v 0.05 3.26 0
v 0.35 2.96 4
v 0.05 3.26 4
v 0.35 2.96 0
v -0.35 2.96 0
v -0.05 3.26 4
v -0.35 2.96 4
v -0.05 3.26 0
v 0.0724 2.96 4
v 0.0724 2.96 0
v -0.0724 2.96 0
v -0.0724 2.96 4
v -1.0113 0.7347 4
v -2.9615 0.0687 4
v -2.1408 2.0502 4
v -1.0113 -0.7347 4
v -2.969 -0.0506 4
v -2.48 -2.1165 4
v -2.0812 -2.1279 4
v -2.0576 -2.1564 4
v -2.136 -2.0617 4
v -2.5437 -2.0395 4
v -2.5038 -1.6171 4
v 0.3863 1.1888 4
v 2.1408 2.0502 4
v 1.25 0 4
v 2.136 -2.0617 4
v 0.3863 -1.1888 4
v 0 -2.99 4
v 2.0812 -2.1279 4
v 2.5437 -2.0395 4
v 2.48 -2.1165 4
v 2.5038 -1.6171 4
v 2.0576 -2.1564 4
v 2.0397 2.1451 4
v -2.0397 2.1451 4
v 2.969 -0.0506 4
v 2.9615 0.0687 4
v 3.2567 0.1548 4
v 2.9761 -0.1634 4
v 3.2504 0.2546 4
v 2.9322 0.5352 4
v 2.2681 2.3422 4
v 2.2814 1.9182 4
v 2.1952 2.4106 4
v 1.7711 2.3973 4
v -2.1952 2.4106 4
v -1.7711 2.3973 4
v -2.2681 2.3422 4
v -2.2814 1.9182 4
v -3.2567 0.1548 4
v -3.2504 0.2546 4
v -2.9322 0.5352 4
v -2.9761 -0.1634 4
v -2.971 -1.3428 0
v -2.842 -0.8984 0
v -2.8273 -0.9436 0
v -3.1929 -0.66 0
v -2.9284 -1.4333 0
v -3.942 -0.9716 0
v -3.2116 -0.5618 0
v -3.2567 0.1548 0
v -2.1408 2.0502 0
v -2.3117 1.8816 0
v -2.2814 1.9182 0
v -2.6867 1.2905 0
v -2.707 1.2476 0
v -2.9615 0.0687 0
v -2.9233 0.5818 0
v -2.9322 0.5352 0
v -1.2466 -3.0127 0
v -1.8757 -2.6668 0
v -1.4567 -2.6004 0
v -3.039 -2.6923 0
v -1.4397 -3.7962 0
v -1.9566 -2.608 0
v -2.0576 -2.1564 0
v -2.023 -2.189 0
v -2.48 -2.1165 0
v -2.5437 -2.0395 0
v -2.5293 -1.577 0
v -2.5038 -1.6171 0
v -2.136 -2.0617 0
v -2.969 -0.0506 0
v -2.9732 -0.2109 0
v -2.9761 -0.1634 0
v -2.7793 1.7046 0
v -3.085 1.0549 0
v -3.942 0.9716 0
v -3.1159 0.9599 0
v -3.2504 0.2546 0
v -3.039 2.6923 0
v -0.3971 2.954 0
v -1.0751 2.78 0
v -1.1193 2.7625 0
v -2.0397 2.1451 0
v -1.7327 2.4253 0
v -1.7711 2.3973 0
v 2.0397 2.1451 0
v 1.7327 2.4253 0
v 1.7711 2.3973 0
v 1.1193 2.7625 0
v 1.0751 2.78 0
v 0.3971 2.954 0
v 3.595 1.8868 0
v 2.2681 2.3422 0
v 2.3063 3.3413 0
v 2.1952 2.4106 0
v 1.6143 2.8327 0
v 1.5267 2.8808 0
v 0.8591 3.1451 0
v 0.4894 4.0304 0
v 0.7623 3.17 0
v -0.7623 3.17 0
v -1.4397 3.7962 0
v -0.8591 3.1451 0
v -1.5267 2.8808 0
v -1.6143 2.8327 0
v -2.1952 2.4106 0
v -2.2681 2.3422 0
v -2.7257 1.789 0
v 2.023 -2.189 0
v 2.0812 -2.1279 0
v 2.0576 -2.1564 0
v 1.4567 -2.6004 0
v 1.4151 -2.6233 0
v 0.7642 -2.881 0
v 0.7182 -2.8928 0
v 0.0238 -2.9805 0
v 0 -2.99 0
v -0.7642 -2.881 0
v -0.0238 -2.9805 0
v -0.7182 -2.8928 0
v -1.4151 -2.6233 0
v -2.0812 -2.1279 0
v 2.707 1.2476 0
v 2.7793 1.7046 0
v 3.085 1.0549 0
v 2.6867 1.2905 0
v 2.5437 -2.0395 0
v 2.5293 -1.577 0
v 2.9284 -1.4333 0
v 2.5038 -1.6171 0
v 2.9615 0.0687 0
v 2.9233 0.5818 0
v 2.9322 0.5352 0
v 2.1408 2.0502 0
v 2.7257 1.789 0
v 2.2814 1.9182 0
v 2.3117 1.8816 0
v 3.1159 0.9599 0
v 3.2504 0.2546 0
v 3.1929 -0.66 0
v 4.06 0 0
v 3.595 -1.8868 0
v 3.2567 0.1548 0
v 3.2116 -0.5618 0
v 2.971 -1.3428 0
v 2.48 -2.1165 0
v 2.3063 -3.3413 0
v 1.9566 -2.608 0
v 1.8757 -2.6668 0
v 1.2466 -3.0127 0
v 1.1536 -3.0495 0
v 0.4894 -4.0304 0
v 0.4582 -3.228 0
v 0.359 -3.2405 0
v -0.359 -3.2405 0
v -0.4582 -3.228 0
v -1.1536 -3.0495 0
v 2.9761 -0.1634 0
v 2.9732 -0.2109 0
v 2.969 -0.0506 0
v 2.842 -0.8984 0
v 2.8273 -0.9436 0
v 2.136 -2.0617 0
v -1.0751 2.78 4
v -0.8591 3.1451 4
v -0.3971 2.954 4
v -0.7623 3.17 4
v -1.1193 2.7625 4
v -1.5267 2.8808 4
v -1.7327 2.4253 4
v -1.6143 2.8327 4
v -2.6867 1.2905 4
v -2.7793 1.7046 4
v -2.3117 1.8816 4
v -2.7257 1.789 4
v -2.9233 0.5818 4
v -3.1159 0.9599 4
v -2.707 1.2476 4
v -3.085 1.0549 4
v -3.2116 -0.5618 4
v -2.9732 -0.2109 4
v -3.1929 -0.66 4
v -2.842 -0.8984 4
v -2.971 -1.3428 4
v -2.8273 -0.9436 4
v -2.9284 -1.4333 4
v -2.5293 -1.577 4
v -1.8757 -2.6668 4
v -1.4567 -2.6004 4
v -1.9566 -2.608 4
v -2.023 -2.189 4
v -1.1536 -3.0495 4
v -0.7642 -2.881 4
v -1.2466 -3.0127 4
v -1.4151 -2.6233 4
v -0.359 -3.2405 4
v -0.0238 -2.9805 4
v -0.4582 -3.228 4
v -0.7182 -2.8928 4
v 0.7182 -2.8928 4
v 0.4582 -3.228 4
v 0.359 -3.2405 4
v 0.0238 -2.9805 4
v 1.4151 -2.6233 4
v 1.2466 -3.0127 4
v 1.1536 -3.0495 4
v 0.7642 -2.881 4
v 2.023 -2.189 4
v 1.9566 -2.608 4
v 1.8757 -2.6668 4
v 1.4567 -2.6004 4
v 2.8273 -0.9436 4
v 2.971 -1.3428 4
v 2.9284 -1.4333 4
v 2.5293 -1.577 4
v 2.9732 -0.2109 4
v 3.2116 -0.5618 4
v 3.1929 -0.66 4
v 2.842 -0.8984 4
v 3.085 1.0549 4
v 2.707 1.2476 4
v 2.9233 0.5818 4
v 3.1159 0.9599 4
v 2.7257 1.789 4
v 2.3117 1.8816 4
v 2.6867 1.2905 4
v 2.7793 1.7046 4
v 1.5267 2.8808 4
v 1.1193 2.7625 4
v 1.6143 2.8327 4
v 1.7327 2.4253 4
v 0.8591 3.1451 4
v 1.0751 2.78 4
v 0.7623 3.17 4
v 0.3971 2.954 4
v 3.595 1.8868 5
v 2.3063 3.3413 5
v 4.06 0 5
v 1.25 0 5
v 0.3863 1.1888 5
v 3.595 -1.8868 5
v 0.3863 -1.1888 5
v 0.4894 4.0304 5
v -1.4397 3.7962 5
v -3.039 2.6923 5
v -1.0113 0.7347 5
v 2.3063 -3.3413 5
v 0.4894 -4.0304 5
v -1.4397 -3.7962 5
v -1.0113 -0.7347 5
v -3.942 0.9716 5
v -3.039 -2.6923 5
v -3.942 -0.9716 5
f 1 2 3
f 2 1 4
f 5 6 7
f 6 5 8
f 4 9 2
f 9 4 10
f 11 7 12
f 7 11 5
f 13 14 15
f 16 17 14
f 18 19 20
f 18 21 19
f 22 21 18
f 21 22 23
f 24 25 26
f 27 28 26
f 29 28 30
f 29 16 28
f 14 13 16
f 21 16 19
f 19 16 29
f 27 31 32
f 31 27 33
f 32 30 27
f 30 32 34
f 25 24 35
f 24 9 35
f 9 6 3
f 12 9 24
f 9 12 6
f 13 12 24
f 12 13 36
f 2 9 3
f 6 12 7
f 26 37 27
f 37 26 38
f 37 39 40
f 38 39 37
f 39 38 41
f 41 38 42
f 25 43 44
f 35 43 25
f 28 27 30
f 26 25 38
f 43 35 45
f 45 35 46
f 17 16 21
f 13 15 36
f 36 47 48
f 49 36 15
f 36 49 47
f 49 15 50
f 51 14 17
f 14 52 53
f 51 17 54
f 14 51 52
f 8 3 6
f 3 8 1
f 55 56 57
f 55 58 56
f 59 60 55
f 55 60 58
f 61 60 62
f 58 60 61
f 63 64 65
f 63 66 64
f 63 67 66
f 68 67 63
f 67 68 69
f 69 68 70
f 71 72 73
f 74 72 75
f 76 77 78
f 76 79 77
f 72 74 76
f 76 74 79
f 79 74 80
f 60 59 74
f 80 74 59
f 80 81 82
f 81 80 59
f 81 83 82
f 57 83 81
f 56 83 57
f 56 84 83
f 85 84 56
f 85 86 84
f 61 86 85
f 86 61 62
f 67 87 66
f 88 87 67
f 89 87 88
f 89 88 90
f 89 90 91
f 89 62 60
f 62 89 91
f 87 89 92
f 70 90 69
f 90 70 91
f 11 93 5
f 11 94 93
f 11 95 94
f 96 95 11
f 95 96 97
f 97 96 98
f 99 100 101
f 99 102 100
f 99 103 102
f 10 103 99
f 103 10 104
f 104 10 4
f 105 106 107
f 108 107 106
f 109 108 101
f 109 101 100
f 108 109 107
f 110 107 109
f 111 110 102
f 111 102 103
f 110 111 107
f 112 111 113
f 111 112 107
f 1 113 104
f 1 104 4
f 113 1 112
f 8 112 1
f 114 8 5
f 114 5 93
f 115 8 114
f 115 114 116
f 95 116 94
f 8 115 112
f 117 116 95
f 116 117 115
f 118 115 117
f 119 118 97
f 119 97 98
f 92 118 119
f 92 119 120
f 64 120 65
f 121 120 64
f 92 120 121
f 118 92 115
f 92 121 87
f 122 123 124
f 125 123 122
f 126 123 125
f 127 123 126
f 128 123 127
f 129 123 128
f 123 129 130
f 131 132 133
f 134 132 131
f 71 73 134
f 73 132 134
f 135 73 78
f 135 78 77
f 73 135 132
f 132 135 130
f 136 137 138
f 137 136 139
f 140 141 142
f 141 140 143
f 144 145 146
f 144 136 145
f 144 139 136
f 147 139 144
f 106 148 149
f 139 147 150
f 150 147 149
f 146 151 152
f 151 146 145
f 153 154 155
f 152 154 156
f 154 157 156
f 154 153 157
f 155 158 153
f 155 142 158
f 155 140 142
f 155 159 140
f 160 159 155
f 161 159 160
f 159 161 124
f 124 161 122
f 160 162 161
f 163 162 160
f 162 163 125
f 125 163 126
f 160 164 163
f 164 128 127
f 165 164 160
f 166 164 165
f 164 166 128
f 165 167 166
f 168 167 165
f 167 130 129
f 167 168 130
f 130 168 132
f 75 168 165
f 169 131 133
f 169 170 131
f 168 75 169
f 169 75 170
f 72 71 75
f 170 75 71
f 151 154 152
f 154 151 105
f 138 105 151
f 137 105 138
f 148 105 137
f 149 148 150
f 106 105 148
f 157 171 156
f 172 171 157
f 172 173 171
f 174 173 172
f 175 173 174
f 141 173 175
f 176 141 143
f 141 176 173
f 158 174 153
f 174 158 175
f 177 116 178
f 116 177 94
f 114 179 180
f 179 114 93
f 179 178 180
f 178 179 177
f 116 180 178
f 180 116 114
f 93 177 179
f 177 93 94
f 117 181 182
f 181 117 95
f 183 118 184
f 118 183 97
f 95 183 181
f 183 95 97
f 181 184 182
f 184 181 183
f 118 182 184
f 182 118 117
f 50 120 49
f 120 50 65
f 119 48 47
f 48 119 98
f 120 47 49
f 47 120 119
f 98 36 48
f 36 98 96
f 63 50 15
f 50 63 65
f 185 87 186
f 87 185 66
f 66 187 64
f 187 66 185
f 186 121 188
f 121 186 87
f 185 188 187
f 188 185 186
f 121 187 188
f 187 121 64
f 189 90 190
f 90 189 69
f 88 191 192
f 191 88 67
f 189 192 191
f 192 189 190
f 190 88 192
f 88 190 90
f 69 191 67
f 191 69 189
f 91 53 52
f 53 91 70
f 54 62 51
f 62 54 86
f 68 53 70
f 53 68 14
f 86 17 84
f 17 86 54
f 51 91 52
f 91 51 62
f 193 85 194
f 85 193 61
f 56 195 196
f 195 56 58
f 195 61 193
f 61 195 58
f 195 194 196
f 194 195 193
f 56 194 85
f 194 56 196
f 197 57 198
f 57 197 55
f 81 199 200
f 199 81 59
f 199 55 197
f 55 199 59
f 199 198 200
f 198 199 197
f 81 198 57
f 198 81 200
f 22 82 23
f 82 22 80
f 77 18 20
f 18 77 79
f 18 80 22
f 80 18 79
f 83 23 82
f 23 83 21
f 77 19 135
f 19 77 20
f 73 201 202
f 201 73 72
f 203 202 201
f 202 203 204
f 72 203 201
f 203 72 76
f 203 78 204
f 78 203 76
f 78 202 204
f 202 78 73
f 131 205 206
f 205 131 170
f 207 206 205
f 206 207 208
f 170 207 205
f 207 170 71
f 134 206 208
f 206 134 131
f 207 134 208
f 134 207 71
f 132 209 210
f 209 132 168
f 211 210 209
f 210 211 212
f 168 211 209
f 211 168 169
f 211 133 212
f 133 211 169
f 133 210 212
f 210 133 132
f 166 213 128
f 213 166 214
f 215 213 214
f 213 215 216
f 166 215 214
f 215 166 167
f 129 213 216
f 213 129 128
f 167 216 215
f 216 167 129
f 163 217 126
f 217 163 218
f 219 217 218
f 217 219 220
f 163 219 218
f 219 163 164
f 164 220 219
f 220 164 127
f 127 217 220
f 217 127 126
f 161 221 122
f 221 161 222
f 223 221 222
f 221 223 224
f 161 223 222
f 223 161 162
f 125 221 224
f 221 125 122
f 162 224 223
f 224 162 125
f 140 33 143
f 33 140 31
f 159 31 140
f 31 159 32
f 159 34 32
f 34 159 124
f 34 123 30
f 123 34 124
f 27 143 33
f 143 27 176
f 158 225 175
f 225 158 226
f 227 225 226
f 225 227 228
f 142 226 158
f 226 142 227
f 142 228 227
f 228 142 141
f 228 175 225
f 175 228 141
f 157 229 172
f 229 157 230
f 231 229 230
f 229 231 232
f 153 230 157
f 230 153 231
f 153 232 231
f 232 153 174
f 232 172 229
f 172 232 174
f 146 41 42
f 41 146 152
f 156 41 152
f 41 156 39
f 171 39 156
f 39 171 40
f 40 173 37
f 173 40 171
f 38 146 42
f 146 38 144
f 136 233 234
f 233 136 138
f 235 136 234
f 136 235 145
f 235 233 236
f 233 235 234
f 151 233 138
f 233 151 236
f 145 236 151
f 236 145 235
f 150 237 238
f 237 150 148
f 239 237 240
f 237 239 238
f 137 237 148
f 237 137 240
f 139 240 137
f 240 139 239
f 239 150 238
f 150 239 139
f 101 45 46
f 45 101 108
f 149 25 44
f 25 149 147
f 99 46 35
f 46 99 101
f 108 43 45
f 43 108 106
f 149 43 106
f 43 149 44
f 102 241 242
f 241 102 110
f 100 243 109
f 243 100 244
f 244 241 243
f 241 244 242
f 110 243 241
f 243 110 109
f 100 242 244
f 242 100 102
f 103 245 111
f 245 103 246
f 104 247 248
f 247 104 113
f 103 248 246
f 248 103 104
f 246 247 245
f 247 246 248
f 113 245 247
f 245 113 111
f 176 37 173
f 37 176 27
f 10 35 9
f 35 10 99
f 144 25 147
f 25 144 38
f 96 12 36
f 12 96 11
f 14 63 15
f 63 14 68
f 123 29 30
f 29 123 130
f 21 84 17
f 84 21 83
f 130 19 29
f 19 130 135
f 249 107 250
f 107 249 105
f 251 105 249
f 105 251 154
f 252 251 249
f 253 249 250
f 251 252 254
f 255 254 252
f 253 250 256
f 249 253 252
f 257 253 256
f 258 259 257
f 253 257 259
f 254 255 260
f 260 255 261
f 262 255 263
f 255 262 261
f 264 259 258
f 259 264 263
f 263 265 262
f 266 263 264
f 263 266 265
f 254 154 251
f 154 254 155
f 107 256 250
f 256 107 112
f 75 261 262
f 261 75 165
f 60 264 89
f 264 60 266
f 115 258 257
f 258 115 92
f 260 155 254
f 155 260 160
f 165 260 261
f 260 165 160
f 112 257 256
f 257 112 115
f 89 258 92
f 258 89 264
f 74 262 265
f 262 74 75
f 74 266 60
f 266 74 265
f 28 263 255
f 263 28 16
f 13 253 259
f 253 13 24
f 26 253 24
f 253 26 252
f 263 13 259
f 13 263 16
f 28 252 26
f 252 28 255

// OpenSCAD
toothLength = 0.7;
toothWidth = 0.1;
toothHeight = 0.3;
toothCount = 25;
headHeight = 4;
headDiameter = 5.92;
headScrewDiameter = 2.5;
headThickness = 1.1;
clear = 0.3;

radius = headDiameter / 2 - toothHeight + clear;

difference() {

    cylinder(r1 = headDiameter / 2 + headThickness, r2 = headDiameter / 2 + headThickness, h = headHeight + 1, center=false);

    cylinder(r1 = headScrewDiameter / 2, r2 = headScrewDiameter / 2, h = 10, center=false);

    union() {
        cylinder(r1 = radius + 0.03, r2 = radius + 0.03, h = headHeight, center = false, $fa = toothCount * 2);

        for (i = [ 0 : toothCount-1 ]) {
            rotate( a = [ 0, 0, i * (360.0 / toothCount)]) {
                translate(v = [0, radius, 0 ]) {
                    linear_extrude(height = headHeight) {
                        polygon(points = [
                            [ -toothLength / 2, 0 ],
                            [ toothLength / 2, 0 ],
                            [ toothWidth / 2, toothHeight ],
                            [ -toothWidth / 2, toothHeight ]
                        ]);
                    };
                };
            };
        };
    };

};
